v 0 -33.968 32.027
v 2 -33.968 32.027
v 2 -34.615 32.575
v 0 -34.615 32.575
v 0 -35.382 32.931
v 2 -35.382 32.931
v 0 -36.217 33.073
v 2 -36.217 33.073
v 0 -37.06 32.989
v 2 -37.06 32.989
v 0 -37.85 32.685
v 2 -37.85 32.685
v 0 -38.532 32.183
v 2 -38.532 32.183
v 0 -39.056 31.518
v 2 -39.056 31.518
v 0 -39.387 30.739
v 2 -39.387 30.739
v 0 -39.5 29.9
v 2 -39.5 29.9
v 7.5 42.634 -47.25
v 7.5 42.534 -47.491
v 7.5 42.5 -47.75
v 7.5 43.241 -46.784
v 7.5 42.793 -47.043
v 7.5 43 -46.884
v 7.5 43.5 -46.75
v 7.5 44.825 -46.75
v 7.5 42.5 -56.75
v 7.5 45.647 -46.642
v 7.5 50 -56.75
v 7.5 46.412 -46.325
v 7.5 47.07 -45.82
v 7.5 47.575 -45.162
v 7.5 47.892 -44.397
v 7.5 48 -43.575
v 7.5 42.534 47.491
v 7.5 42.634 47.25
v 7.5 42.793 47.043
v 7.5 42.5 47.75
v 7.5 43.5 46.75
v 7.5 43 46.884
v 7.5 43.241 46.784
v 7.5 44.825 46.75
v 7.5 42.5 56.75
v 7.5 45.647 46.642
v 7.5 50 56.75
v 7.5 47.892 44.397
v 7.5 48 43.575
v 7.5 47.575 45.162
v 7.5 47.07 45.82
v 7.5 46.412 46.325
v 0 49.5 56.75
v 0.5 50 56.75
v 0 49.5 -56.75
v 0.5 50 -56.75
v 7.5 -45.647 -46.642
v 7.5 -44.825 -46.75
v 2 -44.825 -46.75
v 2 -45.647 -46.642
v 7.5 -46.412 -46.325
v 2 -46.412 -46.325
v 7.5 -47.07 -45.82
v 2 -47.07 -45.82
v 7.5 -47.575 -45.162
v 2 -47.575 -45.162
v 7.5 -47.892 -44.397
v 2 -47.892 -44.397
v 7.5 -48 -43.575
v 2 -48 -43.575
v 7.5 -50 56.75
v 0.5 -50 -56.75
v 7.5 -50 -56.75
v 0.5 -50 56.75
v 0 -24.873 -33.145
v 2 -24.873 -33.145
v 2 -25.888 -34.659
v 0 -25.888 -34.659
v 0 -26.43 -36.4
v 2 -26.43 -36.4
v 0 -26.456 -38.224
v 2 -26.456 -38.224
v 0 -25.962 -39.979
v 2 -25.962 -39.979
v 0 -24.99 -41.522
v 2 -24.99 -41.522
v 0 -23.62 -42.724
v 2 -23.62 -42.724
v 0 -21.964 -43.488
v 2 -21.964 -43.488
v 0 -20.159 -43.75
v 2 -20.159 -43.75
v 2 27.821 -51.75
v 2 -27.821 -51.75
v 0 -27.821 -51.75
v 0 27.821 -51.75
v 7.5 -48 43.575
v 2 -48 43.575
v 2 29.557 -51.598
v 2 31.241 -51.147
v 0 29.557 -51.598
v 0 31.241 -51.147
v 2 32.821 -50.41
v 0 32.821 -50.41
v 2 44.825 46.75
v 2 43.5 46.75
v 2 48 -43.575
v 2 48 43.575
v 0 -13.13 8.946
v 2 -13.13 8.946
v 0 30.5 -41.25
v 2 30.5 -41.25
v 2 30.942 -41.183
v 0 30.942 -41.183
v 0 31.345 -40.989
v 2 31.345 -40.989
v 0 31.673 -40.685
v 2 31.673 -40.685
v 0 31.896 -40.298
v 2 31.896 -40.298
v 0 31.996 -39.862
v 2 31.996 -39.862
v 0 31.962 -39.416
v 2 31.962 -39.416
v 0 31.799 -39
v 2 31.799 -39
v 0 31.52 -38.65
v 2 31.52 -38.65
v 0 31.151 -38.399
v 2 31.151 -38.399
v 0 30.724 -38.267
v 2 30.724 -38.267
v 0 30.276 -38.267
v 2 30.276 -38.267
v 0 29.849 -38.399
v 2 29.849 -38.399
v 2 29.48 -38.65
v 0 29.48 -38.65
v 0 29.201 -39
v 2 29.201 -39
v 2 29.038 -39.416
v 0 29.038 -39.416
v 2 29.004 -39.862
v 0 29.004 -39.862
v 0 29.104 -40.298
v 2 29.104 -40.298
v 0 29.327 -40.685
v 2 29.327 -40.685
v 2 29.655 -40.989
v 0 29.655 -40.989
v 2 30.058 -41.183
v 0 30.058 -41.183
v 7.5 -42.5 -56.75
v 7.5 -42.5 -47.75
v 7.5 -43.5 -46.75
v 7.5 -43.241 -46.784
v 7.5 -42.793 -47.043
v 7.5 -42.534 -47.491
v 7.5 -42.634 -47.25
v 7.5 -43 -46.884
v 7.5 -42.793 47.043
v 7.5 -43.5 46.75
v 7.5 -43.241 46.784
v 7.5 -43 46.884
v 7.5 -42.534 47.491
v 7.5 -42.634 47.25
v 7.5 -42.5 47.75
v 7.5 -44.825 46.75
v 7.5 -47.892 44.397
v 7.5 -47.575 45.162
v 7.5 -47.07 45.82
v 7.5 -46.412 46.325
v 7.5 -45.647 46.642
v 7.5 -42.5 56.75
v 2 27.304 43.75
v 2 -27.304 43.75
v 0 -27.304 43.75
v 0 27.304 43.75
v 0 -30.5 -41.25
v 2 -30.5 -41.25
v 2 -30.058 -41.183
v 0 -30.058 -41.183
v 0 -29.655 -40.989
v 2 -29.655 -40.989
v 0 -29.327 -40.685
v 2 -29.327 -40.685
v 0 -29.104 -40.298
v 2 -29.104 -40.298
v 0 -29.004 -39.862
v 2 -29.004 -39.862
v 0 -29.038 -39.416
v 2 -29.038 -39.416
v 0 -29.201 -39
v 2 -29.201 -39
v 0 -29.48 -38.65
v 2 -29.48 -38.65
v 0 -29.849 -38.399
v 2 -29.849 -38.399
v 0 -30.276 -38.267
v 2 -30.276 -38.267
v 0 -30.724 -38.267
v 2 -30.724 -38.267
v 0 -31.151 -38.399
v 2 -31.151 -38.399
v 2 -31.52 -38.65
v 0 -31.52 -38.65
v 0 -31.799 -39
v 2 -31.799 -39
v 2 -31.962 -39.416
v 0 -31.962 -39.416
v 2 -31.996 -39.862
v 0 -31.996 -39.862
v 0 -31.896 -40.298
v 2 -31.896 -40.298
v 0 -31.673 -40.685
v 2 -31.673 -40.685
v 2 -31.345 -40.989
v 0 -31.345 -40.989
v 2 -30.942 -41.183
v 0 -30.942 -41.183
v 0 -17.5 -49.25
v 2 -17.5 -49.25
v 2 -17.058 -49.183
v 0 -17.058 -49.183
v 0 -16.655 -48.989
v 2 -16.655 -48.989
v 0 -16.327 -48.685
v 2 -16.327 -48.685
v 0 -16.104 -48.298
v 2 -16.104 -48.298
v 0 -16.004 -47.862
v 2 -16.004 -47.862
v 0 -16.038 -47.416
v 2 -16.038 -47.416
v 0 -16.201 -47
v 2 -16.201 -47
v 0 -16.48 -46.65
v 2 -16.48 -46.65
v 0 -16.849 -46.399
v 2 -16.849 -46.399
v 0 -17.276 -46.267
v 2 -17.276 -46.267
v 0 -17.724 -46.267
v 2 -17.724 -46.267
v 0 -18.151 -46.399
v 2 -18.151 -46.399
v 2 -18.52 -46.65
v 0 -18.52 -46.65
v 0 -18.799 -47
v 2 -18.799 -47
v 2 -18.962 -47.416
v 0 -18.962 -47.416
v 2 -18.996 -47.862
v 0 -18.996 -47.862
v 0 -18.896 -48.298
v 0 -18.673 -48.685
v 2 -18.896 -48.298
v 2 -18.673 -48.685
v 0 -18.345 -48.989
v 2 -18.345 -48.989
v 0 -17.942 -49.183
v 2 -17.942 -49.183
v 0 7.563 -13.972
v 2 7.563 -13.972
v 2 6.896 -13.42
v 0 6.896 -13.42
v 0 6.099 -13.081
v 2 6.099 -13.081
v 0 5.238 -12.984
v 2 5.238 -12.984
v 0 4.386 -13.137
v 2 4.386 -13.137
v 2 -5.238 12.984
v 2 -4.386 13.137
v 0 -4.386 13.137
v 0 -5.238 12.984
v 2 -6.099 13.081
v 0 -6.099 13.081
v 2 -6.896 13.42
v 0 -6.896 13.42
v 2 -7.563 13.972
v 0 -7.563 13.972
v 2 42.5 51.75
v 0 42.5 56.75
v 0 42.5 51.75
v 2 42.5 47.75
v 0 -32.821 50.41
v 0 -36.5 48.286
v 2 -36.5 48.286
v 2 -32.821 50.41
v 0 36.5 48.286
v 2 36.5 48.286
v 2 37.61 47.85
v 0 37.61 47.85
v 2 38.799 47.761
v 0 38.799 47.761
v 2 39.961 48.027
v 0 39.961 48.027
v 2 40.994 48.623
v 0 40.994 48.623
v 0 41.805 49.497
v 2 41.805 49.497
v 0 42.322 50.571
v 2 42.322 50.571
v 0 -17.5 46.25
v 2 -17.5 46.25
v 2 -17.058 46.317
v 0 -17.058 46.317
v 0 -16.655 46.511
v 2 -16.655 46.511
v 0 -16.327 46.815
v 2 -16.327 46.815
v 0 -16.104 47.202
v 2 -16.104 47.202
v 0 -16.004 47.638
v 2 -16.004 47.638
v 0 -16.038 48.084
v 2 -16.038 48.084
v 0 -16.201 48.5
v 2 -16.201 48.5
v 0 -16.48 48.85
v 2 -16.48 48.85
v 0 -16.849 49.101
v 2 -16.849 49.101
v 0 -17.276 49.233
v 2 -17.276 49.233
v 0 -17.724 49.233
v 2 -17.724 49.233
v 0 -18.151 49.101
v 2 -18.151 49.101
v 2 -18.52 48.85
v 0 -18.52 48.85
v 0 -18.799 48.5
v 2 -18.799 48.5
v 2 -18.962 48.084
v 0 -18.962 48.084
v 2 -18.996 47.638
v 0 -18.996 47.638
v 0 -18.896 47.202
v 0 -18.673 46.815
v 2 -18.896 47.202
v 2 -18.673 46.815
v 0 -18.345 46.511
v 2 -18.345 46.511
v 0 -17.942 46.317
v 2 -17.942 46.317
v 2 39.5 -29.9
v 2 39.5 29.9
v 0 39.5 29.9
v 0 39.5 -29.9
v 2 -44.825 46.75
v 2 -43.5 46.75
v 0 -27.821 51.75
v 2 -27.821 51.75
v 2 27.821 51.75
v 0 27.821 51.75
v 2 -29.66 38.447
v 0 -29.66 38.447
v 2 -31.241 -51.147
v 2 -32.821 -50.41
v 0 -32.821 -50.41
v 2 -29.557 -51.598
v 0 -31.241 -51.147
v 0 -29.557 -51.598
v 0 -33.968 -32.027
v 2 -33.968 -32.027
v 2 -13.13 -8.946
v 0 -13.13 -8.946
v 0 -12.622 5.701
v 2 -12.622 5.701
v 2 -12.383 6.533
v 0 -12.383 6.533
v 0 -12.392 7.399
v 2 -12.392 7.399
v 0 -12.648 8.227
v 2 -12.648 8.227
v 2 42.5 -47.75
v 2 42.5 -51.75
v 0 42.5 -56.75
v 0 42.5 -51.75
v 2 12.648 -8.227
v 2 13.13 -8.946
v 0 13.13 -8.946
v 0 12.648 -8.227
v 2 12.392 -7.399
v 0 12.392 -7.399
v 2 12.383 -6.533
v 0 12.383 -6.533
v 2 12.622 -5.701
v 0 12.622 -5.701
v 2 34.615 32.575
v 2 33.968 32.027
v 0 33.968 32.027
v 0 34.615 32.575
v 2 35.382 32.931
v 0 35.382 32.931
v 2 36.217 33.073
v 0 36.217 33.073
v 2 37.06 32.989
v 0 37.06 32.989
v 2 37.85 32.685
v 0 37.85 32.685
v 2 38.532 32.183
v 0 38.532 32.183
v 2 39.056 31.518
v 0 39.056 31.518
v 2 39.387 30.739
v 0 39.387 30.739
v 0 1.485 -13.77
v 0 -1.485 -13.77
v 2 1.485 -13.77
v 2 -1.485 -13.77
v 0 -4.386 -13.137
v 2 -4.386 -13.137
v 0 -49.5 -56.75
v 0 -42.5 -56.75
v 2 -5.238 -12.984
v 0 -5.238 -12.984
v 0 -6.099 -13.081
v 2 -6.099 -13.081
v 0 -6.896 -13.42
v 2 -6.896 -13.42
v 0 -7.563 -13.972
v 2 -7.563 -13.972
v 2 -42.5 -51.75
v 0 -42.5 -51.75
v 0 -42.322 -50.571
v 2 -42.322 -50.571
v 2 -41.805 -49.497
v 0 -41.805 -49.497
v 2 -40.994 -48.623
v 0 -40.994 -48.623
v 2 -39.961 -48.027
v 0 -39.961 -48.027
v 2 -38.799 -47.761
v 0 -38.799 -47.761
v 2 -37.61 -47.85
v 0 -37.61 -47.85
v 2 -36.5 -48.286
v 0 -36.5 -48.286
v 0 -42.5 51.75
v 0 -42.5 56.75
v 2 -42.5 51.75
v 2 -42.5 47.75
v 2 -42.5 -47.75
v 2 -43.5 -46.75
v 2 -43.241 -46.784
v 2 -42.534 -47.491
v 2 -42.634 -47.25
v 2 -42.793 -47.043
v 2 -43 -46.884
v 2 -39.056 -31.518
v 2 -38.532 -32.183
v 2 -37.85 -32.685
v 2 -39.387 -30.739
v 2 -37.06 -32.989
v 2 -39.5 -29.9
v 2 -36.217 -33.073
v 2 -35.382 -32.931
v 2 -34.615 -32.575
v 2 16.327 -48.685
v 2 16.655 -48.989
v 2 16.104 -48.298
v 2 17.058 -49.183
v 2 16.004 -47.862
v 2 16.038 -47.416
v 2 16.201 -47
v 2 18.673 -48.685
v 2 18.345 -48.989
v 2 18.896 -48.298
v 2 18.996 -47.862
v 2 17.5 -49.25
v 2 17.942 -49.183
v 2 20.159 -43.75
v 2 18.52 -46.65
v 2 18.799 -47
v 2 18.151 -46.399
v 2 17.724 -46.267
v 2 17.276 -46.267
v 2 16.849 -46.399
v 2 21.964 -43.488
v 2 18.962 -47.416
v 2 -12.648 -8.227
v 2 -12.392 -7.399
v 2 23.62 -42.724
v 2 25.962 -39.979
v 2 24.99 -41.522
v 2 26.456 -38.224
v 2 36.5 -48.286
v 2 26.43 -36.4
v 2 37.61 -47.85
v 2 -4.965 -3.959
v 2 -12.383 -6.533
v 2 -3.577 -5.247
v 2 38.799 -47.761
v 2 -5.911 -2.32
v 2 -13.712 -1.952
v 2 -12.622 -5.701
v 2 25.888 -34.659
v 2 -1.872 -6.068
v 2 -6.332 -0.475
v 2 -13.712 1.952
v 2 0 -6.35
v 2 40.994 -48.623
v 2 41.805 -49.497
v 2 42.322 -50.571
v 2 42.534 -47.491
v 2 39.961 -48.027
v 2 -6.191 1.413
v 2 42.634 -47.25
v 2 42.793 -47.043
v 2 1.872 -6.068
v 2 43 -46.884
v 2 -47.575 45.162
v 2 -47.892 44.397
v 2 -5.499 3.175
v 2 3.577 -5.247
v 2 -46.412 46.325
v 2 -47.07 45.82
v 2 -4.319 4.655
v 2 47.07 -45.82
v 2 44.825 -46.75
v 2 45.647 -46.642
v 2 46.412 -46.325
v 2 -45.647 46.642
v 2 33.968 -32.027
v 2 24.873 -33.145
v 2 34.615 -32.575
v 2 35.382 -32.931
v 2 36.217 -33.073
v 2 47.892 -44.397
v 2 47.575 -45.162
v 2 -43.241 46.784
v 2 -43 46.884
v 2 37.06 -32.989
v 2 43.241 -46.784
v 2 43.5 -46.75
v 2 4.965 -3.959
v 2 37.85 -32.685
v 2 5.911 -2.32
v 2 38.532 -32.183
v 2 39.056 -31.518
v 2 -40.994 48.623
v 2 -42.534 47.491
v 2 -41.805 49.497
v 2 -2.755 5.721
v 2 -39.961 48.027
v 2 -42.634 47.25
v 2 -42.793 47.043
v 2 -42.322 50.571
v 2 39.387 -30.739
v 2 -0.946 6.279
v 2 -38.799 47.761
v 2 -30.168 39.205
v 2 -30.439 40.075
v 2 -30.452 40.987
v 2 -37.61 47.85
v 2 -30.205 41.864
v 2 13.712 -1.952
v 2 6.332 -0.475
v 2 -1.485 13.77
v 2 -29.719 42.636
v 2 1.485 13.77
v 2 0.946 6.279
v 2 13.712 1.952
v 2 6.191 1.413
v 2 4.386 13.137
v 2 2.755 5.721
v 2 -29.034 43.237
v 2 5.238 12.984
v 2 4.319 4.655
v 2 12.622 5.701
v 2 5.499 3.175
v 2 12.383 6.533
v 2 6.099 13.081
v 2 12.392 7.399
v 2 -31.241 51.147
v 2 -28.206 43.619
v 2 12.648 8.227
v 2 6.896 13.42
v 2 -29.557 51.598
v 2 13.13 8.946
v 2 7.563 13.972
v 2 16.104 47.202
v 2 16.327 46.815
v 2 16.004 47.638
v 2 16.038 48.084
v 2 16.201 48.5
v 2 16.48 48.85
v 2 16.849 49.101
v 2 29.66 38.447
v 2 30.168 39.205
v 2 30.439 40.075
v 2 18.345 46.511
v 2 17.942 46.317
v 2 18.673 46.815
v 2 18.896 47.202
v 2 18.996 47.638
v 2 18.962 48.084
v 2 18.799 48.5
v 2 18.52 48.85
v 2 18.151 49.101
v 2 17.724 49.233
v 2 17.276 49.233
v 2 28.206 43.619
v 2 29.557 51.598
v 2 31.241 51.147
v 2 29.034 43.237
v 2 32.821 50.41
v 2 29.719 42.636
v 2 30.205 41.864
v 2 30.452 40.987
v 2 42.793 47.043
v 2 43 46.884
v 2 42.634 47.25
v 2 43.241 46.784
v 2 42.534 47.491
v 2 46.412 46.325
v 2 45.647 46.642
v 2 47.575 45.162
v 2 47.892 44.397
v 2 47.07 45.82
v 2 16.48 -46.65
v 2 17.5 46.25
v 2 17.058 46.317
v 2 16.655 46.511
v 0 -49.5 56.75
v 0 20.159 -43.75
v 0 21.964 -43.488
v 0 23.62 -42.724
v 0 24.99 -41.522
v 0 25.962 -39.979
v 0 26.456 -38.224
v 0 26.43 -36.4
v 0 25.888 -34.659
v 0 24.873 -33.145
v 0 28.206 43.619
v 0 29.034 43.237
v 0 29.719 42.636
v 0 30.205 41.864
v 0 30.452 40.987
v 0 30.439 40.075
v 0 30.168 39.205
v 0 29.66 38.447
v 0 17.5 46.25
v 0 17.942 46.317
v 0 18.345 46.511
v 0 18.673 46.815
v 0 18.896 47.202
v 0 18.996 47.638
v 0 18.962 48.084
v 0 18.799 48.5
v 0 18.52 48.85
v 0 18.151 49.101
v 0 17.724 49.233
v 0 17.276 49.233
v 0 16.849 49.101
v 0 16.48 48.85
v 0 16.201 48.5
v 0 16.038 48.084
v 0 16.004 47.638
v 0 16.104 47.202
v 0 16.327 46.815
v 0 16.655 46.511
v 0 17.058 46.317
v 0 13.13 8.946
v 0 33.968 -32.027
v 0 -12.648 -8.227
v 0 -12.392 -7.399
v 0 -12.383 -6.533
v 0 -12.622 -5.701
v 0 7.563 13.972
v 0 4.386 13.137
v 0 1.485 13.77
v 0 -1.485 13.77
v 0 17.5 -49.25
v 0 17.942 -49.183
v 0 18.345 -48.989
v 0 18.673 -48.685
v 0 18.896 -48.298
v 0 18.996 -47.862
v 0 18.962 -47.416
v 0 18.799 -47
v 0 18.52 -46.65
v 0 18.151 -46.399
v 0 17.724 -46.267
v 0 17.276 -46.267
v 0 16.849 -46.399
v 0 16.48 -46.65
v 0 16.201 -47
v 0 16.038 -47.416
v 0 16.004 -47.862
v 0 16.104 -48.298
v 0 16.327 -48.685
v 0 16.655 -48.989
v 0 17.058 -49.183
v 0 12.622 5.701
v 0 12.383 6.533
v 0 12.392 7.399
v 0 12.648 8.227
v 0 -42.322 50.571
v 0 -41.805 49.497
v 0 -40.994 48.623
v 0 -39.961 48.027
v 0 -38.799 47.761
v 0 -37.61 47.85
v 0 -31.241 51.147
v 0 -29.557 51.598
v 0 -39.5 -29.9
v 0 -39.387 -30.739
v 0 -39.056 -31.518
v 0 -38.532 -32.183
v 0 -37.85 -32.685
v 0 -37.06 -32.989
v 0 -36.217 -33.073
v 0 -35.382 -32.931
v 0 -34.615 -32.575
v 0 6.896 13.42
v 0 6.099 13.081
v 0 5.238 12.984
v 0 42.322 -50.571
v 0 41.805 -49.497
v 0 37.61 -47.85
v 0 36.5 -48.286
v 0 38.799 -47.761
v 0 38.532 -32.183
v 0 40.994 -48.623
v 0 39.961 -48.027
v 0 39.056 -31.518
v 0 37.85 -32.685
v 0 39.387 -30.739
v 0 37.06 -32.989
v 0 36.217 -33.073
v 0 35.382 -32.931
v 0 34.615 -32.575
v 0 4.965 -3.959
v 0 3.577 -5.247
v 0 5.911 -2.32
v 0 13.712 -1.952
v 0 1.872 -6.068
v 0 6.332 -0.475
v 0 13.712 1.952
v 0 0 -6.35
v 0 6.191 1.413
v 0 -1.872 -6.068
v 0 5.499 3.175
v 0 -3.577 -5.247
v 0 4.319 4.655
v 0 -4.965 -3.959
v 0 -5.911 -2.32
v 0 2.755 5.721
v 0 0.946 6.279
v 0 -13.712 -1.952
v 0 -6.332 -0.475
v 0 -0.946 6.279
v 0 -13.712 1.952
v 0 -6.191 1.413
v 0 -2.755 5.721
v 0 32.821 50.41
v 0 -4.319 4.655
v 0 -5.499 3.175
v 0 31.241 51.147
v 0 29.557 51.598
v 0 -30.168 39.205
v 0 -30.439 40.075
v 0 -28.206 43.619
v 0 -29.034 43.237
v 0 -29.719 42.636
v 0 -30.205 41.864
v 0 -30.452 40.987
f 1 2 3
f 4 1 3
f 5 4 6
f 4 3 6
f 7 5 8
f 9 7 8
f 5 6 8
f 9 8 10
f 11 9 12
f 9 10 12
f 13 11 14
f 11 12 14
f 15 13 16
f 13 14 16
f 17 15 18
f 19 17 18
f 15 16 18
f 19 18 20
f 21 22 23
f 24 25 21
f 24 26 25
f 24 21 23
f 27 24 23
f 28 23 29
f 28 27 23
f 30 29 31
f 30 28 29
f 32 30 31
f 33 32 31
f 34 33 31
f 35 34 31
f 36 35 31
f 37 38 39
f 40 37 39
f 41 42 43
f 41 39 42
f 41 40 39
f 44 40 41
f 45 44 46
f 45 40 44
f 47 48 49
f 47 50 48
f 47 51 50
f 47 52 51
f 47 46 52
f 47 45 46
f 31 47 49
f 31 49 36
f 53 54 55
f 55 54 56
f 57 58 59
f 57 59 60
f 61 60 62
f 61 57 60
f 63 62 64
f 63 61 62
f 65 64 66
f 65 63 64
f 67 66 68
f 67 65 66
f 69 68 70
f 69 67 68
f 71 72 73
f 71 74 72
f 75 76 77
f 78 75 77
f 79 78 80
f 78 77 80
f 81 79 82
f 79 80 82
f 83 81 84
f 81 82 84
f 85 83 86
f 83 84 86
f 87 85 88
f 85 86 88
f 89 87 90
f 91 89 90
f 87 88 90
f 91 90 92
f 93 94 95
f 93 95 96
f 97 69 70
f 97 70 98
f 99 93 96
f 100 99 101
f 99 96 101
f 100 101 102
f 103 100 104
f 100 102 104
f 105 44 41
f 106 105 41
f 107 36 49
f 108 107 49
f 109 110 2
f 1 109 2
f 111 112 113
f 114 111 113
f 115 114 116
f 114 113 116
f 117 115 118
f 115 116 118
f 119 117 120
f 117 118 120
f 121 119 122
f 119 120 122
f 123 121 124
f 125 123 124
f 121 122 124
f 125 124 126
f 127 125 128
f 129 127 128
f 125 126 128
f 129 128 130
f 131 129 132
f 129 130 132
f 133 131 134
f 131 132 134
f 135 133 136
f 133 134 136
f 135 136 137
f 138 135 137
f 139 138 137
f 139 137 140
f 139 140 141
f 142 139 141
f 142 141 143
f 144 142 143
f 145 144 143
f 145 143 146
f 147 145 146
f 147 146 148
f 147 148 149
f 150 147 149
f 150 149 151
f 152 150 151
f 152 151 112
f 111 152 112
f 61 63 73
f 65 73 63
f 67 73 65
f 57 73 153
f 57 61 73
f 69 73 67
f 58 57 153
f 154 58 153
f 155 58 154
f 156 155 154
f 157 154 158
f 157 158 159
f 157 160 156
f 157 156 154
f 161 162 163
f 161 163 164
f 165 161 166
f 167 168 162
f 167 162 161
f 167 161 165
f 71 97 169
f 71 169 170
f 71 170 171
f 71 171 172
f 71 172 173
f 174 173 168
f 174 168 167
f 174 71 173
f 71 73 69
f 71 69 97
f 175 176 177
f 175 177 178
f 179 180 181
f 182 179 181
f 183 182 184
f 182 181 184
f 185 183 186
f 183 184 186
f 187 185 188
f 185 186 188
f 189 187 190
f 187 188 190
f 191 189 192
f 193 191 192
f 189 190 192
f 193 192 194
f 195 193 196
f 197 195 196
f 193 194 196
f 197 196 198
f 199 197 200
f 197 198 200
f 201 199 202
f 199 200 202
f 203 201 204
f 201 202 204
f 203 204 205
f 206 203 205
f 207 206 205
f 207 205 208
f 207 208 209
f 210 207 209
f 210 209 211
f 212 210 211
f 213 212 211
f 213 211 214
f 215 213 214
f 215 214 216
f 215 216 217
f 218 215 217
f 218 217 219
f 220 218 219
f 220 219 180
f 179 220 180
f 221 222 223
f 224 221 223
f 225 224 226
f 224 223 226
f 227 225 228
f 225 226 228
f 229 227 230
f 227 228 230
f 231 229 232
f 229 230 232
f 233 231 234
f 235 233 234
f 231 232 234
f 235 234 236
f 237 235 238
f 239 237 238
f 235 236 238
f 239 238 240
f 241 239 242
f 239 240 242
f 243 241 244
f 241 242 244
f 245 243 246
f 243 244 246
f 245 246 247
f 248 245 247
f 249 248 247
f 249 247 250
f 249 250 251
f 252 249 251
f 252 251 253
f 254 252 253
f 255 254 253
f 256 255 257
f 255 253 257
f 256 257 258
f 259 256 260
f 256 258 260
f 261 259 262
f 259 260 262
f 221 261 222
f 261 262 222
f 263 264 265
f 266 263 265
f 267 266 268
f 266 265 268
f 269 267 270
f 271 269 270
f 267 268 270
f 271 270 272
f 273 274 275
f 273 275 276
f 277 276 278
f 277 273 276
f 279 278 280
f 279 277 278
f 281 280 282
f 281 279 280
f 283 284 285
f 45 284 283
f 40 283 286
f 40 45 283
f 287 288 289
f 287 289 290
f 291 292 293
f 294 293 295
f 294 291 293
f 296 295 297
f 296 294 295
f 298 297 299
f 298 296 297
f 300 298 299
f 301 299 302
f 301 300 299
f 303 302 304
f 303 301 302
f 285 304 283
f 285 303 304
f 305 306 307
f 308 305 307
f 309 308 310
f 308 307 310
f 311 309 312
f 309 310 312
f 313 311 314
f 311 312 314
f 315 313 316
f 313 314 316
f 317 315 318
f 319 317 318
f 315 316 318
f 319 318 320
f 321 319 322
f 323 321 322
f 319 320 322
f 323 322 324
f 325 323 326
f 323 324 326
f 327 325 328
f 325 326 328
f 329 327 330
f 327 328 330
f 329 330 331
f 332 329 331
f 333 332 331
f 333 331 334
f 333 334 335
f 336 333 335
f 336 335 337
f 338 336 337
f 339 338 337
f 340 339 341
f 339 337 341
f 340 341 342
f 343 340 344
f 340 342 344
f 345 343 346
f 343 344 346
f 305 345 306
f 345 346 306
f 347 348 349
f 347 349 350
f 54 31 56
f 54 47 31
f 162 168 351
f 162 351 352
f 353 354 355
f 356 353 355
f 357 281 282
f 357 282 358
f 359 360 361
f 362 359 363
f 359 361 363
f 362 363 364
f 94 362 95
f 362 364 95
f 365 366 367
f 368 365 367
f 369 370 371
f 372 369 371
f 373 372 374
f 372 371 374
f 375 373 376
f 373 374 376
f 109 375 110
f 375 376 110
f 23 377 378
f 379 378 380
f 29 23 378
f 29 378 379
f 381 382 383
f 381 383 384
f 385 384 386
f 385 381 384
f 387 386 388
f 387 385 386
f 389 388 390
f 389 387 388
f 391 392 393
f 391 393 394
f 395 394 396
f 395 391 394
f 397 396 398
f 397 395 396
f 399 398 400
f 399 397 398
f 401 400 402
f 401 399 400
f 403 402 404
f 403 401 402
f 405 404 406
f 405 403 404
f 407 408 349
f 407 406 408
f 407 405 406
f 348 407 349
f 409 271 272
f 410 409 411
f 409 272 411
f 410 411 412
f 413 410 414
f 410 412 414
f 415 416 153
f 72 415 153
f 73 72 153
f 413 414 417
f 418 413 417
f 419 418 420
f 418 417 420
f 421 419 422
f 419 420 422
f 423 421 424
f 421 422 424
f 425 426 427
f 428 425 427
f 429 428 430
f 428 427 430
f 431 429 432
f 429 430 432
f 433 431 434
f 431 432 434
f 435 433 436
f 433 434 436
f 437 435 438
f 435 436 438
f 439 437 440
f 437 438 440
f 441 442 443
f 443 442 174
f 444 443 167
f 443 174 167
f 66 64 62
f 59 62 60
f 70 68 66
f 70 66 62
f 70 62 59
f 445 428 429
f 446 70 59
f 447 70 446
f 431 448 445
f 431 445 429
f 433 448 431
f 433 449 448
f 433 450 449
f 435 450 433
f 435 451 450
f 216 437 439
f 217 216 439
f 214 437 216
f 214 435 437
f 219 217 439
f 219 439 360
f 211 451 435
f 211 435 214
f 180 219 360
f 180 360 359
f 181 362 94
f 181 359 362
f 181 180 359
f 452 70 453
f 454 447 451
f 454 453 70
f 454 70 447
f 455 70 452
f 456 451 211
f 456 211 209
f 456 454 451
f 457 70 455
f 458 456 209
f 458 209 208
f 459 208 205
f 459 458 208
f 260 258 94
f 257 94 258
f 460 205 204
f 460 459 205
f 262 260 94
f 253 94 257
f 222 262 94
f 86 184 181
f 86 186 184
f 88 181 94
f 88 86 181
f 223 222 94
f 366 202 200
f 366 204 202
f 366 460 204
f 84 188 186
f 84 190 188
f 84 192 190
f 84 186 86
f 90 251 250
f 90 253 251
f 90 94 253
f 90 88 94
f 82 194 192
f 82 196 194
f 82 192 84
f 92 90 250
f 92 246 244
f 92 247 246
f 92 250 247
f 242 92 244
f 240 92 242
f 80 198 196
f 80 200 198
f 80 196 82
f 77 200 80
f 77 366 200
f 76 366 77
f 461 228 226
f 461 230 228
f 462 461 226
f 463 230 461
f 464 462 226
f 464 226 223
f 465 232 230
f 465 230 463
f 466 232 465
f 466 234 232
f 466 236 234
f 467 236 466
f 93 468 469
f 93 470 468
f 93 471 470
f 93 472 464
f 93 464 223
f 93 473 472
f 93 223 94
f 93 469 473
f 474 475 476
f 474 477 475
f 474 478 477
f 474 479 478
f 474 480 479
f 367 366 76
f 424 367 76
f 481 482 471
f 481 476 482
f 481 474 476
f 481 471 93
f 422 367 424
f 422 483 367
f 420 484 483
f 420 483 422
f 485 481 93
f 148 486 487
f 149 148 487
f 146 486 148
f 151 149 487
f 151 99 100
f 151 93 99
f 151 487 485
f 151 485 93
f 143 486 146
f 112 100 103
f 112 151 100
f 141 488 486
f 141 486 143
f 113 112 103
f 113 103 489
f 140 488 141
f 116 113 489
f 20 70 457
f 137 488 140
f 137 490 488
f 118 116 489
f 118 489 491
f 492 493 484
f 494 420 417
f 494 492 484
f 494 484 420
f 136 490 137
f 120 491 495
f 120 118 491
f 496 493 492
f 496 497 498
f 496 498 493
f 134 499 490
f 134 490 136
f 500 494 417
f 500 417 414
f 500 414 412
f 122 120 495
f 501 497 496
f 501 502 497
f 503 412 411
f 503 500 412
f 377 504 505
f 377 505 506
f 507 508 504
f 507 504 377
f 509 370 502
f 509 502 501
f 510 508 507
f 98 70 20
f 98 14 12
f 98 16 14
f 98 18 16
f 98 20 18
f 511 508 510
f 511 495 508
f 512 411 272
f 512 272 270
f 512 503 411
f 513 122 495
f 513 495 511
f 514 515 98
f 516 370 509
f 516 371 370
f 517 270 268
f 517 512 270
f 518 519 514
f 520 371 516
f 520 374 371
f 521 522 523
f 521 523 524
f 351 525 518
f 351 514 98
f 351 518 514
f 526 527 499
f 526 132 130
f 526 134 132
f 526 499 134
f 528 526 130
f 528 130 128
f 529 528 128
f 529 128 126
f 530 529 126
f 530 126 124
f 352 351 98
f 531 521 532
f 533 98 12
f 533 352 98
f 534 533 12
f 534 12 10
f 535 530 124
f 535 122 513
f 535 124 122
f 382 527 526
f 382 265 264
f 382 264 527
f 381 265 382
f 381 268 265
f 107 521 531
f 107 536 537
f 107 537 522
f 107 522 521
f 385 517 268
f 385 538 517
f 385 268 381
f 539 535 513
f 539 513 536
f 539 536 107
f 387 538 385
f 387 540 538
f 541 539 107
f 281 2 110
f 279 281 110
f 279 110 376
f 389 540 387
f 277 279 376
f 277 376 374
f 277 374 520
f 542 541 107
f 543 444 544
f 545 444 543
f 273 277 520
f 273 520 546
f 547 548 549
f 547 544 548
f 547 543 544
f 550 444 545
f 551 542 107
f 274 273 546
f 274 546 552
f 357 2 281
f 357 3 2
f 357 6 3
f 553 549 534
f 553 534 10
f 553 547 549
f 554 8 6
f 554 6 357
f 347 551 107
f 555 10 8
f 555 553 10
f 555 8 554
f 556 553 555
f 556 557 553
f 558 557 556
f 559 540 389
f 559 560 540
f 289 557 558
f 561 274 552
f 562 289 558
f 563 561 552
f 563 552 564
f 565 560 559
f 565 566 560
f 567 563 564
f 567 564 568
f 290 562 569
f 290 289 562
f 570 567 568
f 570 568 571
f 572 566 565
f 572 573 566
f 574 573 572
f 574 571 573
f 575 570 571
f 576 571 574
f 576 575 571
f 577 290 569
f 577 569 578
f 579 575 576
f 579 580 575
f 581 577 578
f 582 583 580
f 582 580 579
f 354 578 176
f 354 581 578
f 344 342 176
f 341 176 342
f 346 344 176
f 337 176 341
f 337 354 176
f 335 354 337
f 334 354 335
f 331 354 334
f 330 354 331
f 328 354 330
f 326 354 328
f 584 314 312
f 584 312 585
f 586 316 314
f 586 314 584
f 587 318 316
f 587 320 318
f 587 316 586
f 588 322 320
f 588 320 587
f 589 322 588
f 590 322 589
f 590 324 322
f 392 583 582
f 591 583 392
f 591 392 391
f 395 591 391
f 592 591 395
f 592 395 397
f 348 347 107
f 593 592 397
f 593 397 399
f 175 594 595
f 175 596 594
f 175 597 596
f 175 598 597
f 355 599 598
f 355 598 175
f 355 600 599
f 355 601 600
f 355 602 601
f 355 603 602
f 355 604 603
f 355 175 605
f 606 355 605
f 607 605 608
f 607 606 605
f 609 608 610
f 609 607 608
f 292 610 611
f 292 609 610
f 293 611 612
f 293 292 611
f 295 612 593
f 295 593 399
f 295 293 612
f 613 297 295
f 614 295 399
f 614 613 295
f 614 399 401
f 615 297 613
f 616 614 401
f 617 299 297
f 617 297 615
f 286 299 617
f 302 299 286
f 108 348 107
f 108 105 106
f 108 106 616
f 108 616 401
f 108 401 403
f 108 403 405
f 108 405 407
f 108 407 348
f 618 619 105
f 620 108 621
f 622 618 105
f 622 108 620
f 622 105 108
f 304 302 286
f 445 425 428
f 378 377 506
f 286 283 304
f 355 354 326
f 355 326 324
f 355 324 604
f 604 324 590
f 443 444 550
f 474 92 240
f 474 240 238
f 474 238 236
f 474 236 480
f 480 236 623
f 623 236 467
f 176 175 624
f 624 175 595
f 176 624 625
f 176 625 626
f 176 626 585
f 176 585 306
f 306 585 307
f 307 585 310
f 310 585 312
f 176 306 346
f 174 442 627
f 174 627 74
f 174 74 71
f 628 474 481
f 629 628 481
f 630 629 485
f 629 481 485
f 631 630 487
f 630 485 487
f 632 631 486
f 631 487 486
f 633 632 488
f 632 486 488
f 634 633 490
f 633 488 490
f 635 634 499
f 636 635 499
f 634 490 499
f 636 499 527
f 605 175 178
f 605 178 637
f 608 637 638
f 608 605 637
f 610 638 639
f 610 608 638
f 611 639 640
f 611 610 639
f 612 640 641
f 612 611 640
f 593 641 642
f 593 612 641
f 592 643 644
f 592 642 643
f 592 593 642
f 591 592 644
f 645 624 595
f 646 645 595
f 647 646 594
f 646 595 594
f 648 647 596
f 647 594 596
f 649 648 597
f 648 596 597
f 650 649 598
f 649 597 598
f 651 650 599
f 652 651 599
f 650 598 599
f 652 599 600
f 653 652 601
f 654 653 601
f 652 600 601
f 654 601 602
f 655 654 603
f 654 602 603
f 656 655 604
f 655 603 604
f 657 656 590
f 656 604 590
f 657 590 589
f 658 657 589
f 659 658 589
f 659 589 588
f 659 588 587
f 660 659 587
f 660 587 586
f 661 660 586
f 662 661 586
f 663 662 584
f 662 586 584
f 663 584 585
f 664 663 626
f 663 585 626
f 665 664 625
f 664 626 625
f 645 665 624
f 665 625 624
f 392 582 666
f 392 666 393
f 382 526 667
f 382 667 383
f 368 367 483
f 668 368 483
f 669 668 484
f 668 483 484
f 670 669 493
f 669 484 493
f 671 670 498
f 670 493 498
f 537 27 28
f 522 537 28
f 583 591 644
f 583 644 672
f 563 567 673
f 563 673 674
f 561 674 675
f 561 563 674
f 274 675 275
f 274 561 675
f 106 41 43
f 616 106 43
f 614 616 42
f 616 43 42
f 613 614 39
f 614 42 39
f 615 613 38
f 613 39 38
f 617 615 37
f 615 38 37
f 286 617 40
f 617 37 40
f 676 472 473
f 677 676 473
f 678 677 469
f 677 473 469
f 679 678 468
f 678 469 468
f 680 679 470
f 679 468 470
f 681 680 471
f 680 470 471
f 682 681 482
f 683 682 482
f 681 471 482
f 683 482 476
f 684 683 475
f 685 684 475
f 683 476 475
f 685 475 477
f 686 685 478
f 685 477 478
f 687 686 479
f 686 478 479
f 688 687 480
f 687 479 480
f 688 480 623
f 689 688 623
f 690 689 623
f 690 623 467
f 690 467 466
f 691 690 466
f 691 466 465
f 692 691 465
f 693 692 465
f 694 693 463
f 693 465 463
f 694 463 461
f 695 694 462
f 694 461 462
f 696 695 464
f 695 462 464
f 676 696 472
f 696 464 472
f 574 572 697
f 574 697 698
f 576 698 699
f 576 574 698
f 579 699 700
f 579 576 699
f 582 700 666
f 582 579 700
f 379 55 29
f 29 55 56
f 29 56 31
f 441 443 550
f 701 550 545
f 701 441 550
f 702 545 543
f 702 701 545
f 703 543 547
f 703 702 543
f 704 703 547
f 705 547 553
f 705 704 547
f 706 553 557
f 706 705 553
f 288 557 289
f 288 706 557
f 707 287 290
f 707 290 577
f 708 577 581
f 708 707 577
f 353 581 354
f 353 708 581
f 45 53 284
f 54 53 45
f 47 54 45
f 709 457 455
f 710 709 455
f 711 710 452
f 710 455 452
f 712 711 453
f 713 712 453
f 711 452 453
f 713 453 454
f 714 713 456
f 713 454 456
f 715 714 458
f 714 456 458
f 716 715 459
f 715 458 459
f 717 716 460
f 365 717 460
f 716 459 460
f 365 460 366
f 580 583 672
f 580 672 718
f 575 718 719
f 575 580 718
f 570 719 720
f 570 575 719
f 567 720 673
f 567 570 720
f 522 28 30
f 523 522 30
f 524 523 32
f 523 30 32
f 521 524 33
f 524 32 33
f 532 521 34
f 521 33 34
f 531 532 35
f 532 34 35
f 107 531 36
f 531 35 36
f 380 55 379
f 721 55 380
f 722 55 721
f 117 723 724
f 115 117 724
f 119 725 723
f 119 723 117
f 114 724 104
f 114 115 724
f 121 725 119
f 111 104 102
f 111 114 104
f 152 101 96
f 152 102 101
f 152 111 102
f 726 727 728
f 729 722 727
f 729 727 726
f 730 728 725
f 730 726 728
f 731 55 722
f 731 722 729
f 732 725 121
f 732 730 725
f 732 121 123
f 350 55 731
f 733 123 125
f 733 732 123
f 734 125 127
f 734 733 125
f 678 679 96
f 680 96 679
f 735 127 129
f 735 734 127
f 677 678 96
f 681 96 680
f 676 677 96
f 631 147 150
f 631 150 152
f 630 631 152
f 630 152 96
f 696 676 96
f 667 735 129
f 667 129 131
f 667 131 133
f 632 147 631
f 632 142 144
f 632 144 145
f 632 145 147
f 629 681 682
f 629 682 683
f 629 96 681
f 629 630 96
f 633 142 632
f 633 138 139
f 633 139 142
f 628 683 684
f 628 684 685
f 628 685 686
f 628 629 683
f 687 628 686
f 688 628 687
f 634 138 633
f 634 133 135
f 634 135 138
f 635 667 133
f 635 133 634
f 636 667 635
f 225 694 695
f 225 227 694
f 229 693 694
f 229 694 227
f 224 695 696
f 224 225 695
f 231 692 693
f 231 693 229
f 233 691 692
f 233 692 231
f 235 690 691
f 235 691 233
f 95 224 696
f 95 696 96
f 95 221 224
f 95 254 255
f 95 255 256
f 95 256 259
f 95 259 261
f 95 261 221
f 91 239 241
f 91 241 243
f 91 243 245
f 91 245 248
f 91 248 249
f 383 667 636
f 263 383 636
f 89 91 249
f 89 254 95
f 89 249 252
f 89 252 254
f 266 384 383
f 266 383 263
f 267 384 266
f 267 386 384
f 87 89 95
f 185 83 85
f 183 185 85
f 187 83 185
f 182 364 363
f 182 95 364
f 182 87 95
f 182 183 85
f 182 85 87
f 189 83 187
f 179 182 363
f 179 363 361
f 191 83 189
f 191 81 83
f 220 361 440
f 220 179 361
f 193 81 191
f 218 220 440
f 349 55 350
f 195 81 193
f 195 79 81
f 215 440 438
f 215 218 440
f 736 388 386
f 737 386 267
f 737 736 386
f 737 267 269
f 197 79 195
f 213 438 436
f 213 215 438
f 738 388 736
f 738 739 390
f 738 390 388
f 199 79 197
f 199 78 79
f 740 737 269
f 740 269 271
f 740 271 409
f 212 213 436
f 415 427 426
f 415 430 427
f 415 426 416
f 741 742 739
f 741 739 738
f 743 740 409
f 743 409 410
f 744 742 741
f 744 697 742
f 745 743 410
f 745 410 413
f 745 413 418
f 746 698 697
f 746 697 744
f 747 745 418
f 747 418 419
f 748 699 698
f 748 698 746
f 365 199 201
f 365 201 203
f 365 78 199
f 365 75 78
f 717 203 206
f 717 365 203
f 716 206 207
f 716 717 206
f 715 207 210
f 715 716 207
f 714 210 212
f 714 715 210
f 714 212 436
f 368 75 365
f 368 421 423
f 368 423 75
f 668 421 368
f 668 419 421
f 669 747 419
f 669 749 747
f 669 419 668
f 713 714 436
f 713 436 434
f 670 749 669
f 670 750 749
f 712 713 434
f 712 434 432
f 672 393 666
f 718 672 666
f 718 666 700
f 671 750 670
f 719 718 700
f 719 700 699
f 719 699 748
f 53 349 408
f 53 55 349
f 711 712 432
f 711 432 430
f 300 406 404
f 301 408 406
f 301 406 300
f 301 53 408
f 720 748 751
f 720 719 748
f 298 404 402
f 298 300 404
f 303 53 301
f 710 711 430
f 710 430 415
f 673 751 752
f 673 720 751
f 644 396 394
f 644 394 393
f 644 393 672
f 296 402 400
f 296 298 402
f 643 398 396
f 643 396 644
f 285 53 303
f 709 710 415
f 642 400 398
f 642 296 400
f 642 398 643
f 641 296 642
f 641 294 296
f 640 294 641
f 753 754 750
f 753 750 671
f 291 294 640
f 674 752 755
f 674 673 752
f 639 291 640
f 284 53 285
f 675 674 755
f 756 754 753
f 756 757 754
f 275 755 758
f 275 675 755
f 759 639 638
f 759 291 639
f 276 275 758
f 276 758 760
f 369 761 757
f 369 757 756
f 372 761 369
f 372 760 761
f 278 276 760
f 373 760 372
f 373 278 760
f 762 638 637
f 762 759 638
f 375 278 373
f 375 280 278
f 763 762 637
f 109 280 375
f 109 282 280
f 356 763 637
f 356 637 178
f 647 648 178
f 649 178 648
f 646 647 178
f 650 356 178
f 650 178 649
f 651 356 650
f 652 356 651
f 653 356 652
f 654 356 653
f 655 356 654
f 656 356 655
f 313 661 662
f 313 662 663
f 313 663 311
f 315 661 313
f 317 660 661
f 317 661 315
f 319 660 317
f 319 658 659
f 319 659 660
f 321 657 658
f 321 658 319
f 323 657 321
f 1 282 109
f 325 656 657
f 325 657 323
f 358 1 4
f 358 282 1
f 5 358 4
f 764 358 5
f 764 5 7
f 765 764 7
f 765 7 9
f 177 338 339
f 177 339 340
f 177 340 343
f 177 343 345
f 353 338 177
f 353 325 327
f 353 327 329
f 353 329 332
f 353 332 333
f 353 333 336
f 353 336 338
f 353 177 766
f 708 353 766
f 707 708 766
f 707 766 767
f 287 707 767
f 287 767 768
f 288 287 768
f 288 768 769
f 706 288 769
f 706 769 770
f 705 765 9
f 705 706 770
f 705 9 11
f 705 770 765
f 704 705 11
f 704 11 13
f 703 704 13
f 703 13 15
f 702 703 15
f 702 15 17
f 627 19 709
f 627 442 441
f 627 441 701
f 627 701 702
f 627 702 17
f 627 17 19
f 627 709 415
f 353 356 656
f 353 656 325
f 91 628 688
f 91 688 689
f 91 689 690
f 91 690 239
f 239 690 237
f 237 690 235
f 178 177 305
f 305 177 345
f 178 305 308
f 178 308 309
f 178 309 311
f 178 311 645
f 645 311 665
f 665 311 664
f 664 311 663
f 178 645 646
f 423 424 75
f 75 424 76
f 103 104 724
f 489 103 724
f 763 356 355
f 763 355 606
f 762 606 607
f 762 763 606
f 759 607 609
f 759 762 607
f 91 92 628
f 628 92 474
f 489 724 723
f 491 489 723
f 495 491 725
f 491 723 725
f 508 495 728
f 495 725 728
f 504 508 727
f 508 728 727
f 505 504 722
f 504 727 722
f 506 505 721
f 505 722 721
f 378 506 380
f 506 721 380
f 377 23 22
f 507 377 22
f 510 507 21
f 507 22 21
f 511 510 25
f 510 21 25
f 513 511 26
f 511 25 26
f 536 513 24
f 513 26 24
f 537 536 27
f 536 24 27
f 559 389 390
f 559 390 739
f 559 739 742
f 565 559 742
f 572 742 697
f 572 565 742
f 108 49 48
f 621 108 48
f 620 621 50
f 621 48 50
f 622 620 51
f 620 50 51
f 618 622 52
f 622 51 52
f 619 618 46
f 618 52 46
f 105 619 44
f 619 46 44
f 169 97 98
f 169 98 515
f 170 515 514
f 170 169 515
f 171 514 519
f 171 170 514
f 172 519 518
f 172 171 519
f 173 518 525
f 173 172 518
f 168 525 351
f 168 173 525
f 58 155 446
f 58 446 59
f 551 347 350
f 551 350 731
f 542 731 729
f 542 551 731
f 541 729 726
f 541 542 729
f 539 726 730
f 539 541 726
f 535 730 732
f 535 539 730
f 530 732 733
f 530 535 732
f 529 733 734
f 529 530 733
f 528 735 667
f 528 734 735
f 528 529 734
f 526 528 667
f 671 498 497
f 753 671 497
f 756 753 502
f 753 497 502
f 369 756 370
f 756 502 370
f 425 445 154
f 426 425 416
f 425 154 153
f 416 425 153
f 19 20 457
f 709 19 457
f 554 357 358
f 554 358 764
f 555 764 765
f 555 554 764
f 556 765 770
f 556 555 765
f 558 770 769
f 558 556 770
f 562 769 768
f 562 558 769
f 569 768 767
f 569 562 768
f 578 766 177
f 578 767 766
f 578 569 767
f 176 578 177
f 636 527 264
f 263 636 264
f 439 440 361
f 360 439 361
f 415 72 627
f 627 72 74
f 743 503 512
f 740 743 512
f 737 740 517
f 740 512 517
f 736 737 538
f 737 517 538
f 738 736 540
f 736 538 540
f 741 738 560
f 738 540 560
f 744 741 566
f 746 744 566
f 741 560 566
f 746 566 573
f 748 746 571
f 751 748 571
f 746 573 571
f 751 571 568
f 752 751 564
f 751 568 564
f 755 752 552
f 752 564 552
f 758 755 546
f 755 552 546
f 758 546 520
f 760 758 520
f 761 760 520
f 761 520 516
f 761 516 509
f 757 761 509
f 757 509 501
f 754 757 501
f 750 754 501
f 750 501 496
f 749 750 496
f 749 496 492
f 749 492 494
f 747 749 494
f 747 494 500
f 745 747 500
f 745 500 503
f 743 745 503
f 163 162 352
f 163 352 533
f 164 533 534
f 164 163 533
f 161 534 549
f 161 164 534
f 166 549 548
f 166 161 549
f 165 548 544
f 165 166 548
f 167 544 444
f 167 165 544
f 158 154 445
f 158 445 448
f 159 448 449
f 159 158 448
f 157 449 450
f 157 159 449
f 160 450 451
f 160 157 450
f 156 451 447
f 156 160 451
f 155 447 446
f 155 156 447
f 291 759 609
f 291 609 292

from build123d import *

# Parameters (mm, degrees)
BOSS_EXTRUDE1_DEPTH = 56.75
SKETCH2_W           = 5
SKETCH2_H           = 85
SKETCH2_R           = 1.5
CUT_EXTRUDE1_DEPTH  = 2
SKETCH3_R           = 6.35
SKETCH3_R_2         = 1.5
CUT_EXTRUDE2_DEPTH  = 3
CHAMFER1_SIZE       = 0.5
CUT_EXTRUDE3_DEPTH  = 5.5
CUT_EXTRUDE4_DEPTH  = 10


with BuildPart() as part:
    # Sketch1 → Boss-Extrude1 (new body, symmetric)
    with BuildSketch(Plane.XY):
        Polygon((0, 50), (0, -50), (7.5, -50), (7.5, -42.5), (2, -42.5), (2, 42.5), (7.5, 42.5), (7.5, 50), align=None)
    extrude(amount=BOSS_EXTRUDE1_DEPTH, both=True)

    # Sketch2 → Cut-Extrude1 (cut)
    with BuildSketch(Plane(origin=(2, 0, 0), x_dir=(0, 0, -1), z_dir=(1, 0, 0))):
        with Locations((-54.25, 0)):
            Rectangle(SKETCH2_W, SKETCH2_H)
        with Locations((54.25, 0)):
            Rectangle(SKETCH2_W, SKETCH2_H)
        with Locations((-47.75, 17.5)):
            Circle(SKETCH2_R)
        with Locations((-47.75, -17.5)):
            Circle(SKETCH2_R)
        with Locations((47.75, 17.5)):
            Circle(SKETCH2_R)
        with Locations((47.75, -17.5)):
            Circle(SKETCH2_R)
    extrude(amount=-CUT_EXTRUDE1_DEPTH, mode=Mode.SUBTRACT)

    # Sketch3 → Cut-Extrude2 (cut, through all)
    with BuildSketch(Plane(origin=(2, 0, 0), x_dir=(0, 0, -1), z_dir=(1, 0, 0))):
        Circle(SKETCH3_R)
        with Locations((39.75, 30.5)):
            Circle(SKETCH3_R_2)
        with Locations((39.75, -30.5)):
            Circle(SKETCH3_R_2)
        with BuildLine():
            Line((-29.899655804, -39.5), (29.899655804, -39.5))
            ThreePointArc((29.899655804, -39.5), (32.863003185, -37.464823364), (32.027336169, -33.968392001))
            Line((32.027336169, -33.968392001), (8.946350194, -13.129558949))
            ThreePointArc((8.946350194, -13.129558949), (7.399307524, -12.392275536), (5.701057458, -12.622220243))
            ThreePointArc((5.701057458, -12.622220243), (0, -13.85), (-5.701057458, -12.622220243))
            ThreePointArc((-5.701057458, -12.622220243), (-7.399307524, -12.392275536), (-8.946350194, -13.129558949))
            Line((-8.946350194, -13.129558949), (-32.027336169, -33.968392001))
            ThreePointArc((-32.027336169, -33.968392001), (-32.863003185, -37.464823364), (-29.899655804, -39.5))
        make_face()
        with BuildLine():
            Line((-43.75, -27.303546383), (-43.75, 27.303546383))
            ThreePointArc((-43.75, 27.303546383), (-41.864426198, 30.204926241), (-38.447319635, 29.660154382))
            Line((-38.447319635, 29.660154382), (-13.972366805, 7.562768399))
            ThreePointArc((-13.972366805, 7.562768399), (-13.081370721, 6.098851109), (-13.137175803, 4.386013216))
            ThreePointArc((-13.137175803, 4.386013216), (-13.85, 0), (-13.137175803, -4.386013216))
            ThreePointArc((-13.137175803, -4.386013216), (-13.081370721, -6.098851109), (-13.972366805, -7.562768399))
            Line((-13.972366805, -7.562768399), (-38.447319635, -29.660154382))
            ThreePointArc((-38.447319635, -29.660154382), (-41.864426198, -30.204926241), (-43.75, -27.303546383))
        make_face()
        with BuildLine():
            Line((-29.899655804, 39.5), (29.899655804, 39.5))
            ThreePointArc((29.899655804, 39.5), (32.863003185, 37.464823364), (32.027336169, 33.968392001))
            Line((32.027336169, 33.968392001), (8.946350194, 13.129558949))
            ThreePointArc((8.946350194, 13.129558949), (7.399307524, 12.392275536), (5.701057458, 12.622220243))
            ThreePointArc((5.701057458, 12.622220243), (0, 13.85), (-5.701057458, 12.622220243))
            ThreePointArc((-5.701057458, 12.622220243), (-7.399307524, 12.392275536), (-8.946350194, 13.129558949))
            Line((-8.946350194, 13.129558949), (-32.027336169, 33.968392001))
            ThreePointArc((-32.027336169, 33.968392001), (-32.863003185, 37.464823364), (-29.899655804, 39.5))
        make_face()
        with BuildLine():
            Line((43.75, -20.159375539), (43.75, 20.159375539))
            ThreePointArc((43.75, 20.159375539), (39.978852396, 25.962135255), (33.144639269, 24.872591538))
            Line((33.144639269, 24.872591538), (13.972366805, 7.562768399))
            ThreePointArc((13.972366805, 7.562768399), (13.081370721, 6.098851109), (13.137175803, 4.386013216))
            ThreePointArc((13.137175803, 4.386013216), (13.85, 0), (13.137175803, -4.386013216))
            ThreePointArc((13.137175803, -4.386013216), (13.081370721, -6.098851109), (13.972366805, -7.562768399))
            Line((13.972366805, -7.562768399), (33.144639269, -24.872591538))
            ThreePointArc((33.144639269, -24.872591538), (39.978852396, -25.962135255), (43.75, -20.159375539))
        make_face()
    extrude(amount=-CUT_EXTRUDE2_DEPTH, mode=Mode.SUBTRACT)

    # Chamfer1
    chamfer1_edges = [part.edges().sort_by_distance(p)[0] for p in [
        (0, -50, 0),
        (0, 50, 0),
    ]]
    chamfer(chamfer1_edges, length=CHAMFER1_SIZE)

    # Sketch4 → Cut-Extrude3 (cut)
    with BuildSketch(Plane(origin=(7.5, 0, 0), x_dir=(0, 0, -1), z_dir=(1, 0, 0))):
        with BuildLine():
            Line((43.575, -48), (-43.575, -48))
            ThreePointArc((-43.575, -48), (-45.82006403, -47.07006403), (-46.75, -44.825))
            Line((-46.75, -44.825), (-46.75, -43.5))
            ThreePointArc((-46.75, -43.5), (-47.042893219, -42.792893219), (-47.75, -42.5))
            Line((-47.75, -42.5), (47.75, -42.5))
            ThreePointArc((47.75, -42.5), (47.042893219, -42.792893219), (46.75, -43.5))
            Line((46.75, -43.5), (46.75, -44.825))
            ThreePointArc((46.75, -44.825), (45.82006403, -47.07006403), (43.575, -48))
        make_face()
        with BuildLine():
            Line((-46.75, 44.825), (-46.75, 43.5))
            ThreePointArc((-46.75, 43.5), (-47.042893219, 42.792893219), (-47.75, 42.5))
            Line((-47.75, 42.5), (47.75, 42.5))
            ThreePointArc((47.75, 42.5), (47.042893219, 42.792893219), (46.75, 43.5))
            Line((46.75, 43.5), (46.75, 44.825))
            ThreePointArc((46.75, 44.825), (45.82006403, 47.07006403), (43.575, 48))
            Line((43.575, 48), (-43.575, 48))
            ThreePointArc((-43.575, 48), (-45.82006403, 47.07006403), (-46.75, 44.825))
        make_face()
    extrude(amount=-CUT_EXTRUDE3_DEPTH, mode=Mode.SUBTRACT)

    # Sketch5 → Cut-Extrude4 (cut)
    with BuildSketch(Plane.ZY):
        with BuildLine():
            ThreePointArc((-51.75, 27.820508076), (-51.409258263, 30.408698527), (-50.410254038, 32.820508076))
            Line((-50.410254038, 32.820508076), (-48.285898385, 36.5))
            ThreePointArc((-48.285898385, 36.5), (-48.285898385, 40.5), (-51.75, 42.5))
            Line((-51.75, 42.5), (-51.75, 27.820508076))
        make_face()
        with BuildLine():
            ThreePointArc((-50.410254038, -32.820508076), (-51.409258263, -30.408698527), (-51.75, -27.820508076))
            Line((-51.75, -27.820508076), (-51.75, -42.5))
            ThreePointArc((-51.75, -42.5), (-48.285898385, -40.5), (-48.285898385, -36.5))
            Line((-48.285898385, -36.5), (-50.410254038, -32.820508076))
        make_face()
    cut_extrude4 = extrude(amount=-CUT_EXTRUDE4_DEPTH, mode=Mode.SUBTRACT)

    # Mirror1: Cut-Extrude4 across plane
    add(cut_extrude4.mirror(Plane.XY), mode=Mode.SUBTRACT)


solid = part.part
